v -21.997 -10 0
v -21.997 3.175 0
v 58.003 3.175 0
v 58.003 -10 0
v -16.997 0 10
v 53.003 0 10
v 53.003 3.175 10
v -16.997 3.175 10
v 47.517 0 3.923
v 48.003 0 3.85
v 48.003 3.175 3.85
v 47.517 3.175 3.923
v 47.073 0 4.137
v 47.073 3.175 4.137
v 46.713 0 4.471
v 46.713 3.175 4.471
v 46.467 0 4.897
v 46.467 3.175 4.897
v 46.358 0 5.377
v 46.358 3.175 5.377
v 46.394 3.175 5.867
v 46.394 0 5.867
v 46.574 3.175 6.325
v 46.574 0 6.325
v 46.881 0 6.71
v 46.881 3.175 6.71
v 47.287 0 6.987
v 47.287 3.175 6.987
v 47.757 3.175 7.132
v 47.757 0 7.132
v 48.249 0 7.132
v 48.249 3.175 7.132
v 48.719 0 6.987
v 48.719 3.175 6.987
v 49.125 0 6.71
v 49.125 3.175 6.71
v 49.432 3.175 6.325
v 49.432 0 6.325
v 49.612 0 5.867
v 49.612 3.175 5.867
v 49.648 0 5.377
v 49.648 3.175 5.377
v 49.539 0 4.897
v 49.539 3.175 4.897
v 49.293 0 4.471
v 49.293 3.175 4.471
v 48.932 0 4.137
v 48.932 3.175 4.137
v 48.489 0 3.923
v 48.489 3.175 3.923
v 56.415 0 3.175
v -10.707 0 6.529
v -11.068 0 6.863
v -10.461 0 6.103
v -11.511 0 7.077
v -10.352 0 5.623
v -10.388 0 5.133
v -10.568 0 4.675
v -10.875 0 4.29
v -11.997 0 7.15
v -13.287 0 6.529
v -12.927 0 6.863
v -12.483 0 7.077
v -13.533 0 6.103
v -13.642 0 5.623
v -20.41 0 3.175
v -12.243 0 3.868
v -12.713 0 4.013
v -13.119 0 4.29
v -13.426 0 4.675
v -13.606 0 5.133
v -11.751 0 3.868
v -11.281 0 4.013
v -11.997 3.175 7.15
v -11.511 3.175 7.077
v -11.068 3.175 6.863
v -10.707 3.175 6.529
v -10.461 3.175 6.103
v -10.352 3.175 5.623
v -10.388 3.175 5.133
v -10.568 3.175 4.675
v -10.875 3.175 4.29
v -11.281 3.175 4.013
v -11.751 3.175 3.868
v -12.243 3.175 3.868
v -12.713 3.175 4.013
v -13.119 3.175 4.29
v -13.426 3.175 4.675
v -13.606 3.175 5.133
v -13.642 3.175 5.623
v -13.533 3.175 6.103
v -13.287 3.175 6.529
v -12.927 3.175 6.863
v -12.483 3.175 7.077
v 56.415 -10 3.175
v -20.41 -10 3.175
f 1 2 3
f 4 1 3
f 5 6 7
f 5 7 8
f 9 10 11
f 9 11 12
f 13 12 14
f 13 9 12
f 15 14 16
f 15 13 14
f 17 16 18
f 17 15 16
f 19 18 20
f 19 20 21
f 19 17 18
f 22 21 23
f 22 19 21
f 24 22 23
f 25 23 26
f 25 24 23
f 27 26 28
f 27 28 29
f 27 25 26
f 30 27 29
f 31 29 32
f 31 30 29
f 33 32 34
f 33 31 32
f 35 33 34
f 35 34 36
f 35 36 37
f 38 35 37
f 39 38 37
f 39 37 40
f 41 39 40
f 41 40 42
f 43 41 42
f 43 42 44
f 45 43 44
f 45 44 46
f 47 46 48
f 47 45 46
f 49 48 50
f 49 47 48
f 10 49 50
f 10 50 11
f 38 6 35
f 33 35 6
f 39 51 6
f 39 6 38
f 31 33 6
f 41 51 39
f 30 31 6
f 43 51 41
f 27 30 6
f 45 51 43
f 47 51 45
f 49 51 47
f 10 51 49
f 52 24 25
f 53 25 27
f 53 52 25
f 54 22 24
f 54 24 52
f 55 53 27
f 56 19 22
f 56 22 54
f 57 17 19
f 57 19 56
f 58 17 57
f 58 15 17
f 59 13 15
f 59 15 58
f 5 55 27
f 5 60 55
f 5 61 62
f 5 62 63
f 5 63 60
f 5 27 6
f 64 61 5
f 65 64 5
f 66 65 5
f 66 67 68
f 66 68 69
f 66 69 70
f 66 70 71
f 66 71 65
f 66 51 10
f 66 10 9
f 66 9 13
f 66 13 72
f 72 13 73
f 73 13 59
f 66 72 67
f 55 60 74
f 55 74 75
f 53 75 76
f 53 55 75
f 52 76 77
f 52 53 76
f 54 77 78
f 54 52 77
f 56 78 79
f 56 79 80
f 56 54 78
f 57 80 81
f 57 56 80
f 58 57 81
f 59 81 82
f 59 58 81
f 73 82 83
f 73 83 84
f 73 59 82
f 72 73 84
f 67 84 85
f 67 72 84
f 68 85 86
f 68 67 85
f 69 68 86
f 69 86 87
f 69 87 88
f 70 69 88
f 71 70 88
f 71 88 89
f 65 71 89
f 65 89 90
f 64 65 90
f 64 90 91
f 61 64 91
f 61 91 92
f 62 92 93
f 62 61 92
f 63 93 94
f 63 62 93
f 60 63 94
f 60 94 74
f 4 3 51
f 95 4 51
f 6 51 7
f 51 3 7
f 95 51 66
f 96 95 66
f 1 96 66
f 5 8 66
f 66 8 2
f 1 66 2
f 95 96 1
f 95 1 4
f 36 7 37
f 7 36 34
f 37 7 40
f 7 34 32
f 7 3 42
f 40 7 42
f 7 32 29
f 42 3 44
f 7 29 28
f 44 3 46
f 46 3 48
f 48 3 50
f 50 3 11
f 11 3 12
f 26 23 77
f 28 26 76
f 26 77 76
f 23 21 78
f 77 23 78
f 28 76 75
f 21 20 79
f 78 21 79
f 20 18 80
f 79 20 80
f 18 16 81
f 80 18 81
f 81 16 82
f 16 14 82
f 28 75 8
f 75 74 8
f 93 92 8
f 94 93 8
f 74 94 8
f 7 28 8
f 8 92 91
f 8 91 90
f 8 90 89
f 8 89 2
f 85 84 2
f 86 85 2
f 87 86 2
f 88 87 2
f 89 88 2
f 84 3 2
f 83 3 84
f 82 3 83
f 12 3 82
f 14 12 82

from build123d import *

# Parameters (mm, degrees)
SKETCH1_R           = 1.65
BOSS_EXTRUDE1_DEPTH = 3.175
BOSS_EXTRUDE2_DEPTH = 10


with BuildPart() as part:
    # Sketch1 → Boss-Extrude1 (new body)
    with BuildSketch(Plane(origin=(0, 0, 0), x_dir=(1, 0, 0), z_dir=(0, 1, 0))):
        Polygon((-21.997084548, 0), (58.002915452, 0), (53.002915452, -10), (-16.997084548, -10), align=None)
        with Locations(Location((-11.997084548, -5.5, 0), (0, 0, 270))):
            Circle(SKETCH1_R, mode=Mode.SUBTRACT)
        with Locations(Location((48.002915452, -5.5, 0), (0, 0, 90))):
            Circle(SKETCH1_R, mode=Mode.SUBTRACT)
    extrude(amount=BOSS_EXTRUDE1_DEPTH)

    # Sketch2 → Boss-Extrude2 (add)
    with BuildSketch(Plane.XZ):
        Polygon((58.002915452, 0), (56.415415452, 3.175), (-20.409584548, 3.175), (-21.997084548, 0), align=None)
    extrude(amount=BOSS_EXTRUDE2_DEPTH)


solid = part.part
